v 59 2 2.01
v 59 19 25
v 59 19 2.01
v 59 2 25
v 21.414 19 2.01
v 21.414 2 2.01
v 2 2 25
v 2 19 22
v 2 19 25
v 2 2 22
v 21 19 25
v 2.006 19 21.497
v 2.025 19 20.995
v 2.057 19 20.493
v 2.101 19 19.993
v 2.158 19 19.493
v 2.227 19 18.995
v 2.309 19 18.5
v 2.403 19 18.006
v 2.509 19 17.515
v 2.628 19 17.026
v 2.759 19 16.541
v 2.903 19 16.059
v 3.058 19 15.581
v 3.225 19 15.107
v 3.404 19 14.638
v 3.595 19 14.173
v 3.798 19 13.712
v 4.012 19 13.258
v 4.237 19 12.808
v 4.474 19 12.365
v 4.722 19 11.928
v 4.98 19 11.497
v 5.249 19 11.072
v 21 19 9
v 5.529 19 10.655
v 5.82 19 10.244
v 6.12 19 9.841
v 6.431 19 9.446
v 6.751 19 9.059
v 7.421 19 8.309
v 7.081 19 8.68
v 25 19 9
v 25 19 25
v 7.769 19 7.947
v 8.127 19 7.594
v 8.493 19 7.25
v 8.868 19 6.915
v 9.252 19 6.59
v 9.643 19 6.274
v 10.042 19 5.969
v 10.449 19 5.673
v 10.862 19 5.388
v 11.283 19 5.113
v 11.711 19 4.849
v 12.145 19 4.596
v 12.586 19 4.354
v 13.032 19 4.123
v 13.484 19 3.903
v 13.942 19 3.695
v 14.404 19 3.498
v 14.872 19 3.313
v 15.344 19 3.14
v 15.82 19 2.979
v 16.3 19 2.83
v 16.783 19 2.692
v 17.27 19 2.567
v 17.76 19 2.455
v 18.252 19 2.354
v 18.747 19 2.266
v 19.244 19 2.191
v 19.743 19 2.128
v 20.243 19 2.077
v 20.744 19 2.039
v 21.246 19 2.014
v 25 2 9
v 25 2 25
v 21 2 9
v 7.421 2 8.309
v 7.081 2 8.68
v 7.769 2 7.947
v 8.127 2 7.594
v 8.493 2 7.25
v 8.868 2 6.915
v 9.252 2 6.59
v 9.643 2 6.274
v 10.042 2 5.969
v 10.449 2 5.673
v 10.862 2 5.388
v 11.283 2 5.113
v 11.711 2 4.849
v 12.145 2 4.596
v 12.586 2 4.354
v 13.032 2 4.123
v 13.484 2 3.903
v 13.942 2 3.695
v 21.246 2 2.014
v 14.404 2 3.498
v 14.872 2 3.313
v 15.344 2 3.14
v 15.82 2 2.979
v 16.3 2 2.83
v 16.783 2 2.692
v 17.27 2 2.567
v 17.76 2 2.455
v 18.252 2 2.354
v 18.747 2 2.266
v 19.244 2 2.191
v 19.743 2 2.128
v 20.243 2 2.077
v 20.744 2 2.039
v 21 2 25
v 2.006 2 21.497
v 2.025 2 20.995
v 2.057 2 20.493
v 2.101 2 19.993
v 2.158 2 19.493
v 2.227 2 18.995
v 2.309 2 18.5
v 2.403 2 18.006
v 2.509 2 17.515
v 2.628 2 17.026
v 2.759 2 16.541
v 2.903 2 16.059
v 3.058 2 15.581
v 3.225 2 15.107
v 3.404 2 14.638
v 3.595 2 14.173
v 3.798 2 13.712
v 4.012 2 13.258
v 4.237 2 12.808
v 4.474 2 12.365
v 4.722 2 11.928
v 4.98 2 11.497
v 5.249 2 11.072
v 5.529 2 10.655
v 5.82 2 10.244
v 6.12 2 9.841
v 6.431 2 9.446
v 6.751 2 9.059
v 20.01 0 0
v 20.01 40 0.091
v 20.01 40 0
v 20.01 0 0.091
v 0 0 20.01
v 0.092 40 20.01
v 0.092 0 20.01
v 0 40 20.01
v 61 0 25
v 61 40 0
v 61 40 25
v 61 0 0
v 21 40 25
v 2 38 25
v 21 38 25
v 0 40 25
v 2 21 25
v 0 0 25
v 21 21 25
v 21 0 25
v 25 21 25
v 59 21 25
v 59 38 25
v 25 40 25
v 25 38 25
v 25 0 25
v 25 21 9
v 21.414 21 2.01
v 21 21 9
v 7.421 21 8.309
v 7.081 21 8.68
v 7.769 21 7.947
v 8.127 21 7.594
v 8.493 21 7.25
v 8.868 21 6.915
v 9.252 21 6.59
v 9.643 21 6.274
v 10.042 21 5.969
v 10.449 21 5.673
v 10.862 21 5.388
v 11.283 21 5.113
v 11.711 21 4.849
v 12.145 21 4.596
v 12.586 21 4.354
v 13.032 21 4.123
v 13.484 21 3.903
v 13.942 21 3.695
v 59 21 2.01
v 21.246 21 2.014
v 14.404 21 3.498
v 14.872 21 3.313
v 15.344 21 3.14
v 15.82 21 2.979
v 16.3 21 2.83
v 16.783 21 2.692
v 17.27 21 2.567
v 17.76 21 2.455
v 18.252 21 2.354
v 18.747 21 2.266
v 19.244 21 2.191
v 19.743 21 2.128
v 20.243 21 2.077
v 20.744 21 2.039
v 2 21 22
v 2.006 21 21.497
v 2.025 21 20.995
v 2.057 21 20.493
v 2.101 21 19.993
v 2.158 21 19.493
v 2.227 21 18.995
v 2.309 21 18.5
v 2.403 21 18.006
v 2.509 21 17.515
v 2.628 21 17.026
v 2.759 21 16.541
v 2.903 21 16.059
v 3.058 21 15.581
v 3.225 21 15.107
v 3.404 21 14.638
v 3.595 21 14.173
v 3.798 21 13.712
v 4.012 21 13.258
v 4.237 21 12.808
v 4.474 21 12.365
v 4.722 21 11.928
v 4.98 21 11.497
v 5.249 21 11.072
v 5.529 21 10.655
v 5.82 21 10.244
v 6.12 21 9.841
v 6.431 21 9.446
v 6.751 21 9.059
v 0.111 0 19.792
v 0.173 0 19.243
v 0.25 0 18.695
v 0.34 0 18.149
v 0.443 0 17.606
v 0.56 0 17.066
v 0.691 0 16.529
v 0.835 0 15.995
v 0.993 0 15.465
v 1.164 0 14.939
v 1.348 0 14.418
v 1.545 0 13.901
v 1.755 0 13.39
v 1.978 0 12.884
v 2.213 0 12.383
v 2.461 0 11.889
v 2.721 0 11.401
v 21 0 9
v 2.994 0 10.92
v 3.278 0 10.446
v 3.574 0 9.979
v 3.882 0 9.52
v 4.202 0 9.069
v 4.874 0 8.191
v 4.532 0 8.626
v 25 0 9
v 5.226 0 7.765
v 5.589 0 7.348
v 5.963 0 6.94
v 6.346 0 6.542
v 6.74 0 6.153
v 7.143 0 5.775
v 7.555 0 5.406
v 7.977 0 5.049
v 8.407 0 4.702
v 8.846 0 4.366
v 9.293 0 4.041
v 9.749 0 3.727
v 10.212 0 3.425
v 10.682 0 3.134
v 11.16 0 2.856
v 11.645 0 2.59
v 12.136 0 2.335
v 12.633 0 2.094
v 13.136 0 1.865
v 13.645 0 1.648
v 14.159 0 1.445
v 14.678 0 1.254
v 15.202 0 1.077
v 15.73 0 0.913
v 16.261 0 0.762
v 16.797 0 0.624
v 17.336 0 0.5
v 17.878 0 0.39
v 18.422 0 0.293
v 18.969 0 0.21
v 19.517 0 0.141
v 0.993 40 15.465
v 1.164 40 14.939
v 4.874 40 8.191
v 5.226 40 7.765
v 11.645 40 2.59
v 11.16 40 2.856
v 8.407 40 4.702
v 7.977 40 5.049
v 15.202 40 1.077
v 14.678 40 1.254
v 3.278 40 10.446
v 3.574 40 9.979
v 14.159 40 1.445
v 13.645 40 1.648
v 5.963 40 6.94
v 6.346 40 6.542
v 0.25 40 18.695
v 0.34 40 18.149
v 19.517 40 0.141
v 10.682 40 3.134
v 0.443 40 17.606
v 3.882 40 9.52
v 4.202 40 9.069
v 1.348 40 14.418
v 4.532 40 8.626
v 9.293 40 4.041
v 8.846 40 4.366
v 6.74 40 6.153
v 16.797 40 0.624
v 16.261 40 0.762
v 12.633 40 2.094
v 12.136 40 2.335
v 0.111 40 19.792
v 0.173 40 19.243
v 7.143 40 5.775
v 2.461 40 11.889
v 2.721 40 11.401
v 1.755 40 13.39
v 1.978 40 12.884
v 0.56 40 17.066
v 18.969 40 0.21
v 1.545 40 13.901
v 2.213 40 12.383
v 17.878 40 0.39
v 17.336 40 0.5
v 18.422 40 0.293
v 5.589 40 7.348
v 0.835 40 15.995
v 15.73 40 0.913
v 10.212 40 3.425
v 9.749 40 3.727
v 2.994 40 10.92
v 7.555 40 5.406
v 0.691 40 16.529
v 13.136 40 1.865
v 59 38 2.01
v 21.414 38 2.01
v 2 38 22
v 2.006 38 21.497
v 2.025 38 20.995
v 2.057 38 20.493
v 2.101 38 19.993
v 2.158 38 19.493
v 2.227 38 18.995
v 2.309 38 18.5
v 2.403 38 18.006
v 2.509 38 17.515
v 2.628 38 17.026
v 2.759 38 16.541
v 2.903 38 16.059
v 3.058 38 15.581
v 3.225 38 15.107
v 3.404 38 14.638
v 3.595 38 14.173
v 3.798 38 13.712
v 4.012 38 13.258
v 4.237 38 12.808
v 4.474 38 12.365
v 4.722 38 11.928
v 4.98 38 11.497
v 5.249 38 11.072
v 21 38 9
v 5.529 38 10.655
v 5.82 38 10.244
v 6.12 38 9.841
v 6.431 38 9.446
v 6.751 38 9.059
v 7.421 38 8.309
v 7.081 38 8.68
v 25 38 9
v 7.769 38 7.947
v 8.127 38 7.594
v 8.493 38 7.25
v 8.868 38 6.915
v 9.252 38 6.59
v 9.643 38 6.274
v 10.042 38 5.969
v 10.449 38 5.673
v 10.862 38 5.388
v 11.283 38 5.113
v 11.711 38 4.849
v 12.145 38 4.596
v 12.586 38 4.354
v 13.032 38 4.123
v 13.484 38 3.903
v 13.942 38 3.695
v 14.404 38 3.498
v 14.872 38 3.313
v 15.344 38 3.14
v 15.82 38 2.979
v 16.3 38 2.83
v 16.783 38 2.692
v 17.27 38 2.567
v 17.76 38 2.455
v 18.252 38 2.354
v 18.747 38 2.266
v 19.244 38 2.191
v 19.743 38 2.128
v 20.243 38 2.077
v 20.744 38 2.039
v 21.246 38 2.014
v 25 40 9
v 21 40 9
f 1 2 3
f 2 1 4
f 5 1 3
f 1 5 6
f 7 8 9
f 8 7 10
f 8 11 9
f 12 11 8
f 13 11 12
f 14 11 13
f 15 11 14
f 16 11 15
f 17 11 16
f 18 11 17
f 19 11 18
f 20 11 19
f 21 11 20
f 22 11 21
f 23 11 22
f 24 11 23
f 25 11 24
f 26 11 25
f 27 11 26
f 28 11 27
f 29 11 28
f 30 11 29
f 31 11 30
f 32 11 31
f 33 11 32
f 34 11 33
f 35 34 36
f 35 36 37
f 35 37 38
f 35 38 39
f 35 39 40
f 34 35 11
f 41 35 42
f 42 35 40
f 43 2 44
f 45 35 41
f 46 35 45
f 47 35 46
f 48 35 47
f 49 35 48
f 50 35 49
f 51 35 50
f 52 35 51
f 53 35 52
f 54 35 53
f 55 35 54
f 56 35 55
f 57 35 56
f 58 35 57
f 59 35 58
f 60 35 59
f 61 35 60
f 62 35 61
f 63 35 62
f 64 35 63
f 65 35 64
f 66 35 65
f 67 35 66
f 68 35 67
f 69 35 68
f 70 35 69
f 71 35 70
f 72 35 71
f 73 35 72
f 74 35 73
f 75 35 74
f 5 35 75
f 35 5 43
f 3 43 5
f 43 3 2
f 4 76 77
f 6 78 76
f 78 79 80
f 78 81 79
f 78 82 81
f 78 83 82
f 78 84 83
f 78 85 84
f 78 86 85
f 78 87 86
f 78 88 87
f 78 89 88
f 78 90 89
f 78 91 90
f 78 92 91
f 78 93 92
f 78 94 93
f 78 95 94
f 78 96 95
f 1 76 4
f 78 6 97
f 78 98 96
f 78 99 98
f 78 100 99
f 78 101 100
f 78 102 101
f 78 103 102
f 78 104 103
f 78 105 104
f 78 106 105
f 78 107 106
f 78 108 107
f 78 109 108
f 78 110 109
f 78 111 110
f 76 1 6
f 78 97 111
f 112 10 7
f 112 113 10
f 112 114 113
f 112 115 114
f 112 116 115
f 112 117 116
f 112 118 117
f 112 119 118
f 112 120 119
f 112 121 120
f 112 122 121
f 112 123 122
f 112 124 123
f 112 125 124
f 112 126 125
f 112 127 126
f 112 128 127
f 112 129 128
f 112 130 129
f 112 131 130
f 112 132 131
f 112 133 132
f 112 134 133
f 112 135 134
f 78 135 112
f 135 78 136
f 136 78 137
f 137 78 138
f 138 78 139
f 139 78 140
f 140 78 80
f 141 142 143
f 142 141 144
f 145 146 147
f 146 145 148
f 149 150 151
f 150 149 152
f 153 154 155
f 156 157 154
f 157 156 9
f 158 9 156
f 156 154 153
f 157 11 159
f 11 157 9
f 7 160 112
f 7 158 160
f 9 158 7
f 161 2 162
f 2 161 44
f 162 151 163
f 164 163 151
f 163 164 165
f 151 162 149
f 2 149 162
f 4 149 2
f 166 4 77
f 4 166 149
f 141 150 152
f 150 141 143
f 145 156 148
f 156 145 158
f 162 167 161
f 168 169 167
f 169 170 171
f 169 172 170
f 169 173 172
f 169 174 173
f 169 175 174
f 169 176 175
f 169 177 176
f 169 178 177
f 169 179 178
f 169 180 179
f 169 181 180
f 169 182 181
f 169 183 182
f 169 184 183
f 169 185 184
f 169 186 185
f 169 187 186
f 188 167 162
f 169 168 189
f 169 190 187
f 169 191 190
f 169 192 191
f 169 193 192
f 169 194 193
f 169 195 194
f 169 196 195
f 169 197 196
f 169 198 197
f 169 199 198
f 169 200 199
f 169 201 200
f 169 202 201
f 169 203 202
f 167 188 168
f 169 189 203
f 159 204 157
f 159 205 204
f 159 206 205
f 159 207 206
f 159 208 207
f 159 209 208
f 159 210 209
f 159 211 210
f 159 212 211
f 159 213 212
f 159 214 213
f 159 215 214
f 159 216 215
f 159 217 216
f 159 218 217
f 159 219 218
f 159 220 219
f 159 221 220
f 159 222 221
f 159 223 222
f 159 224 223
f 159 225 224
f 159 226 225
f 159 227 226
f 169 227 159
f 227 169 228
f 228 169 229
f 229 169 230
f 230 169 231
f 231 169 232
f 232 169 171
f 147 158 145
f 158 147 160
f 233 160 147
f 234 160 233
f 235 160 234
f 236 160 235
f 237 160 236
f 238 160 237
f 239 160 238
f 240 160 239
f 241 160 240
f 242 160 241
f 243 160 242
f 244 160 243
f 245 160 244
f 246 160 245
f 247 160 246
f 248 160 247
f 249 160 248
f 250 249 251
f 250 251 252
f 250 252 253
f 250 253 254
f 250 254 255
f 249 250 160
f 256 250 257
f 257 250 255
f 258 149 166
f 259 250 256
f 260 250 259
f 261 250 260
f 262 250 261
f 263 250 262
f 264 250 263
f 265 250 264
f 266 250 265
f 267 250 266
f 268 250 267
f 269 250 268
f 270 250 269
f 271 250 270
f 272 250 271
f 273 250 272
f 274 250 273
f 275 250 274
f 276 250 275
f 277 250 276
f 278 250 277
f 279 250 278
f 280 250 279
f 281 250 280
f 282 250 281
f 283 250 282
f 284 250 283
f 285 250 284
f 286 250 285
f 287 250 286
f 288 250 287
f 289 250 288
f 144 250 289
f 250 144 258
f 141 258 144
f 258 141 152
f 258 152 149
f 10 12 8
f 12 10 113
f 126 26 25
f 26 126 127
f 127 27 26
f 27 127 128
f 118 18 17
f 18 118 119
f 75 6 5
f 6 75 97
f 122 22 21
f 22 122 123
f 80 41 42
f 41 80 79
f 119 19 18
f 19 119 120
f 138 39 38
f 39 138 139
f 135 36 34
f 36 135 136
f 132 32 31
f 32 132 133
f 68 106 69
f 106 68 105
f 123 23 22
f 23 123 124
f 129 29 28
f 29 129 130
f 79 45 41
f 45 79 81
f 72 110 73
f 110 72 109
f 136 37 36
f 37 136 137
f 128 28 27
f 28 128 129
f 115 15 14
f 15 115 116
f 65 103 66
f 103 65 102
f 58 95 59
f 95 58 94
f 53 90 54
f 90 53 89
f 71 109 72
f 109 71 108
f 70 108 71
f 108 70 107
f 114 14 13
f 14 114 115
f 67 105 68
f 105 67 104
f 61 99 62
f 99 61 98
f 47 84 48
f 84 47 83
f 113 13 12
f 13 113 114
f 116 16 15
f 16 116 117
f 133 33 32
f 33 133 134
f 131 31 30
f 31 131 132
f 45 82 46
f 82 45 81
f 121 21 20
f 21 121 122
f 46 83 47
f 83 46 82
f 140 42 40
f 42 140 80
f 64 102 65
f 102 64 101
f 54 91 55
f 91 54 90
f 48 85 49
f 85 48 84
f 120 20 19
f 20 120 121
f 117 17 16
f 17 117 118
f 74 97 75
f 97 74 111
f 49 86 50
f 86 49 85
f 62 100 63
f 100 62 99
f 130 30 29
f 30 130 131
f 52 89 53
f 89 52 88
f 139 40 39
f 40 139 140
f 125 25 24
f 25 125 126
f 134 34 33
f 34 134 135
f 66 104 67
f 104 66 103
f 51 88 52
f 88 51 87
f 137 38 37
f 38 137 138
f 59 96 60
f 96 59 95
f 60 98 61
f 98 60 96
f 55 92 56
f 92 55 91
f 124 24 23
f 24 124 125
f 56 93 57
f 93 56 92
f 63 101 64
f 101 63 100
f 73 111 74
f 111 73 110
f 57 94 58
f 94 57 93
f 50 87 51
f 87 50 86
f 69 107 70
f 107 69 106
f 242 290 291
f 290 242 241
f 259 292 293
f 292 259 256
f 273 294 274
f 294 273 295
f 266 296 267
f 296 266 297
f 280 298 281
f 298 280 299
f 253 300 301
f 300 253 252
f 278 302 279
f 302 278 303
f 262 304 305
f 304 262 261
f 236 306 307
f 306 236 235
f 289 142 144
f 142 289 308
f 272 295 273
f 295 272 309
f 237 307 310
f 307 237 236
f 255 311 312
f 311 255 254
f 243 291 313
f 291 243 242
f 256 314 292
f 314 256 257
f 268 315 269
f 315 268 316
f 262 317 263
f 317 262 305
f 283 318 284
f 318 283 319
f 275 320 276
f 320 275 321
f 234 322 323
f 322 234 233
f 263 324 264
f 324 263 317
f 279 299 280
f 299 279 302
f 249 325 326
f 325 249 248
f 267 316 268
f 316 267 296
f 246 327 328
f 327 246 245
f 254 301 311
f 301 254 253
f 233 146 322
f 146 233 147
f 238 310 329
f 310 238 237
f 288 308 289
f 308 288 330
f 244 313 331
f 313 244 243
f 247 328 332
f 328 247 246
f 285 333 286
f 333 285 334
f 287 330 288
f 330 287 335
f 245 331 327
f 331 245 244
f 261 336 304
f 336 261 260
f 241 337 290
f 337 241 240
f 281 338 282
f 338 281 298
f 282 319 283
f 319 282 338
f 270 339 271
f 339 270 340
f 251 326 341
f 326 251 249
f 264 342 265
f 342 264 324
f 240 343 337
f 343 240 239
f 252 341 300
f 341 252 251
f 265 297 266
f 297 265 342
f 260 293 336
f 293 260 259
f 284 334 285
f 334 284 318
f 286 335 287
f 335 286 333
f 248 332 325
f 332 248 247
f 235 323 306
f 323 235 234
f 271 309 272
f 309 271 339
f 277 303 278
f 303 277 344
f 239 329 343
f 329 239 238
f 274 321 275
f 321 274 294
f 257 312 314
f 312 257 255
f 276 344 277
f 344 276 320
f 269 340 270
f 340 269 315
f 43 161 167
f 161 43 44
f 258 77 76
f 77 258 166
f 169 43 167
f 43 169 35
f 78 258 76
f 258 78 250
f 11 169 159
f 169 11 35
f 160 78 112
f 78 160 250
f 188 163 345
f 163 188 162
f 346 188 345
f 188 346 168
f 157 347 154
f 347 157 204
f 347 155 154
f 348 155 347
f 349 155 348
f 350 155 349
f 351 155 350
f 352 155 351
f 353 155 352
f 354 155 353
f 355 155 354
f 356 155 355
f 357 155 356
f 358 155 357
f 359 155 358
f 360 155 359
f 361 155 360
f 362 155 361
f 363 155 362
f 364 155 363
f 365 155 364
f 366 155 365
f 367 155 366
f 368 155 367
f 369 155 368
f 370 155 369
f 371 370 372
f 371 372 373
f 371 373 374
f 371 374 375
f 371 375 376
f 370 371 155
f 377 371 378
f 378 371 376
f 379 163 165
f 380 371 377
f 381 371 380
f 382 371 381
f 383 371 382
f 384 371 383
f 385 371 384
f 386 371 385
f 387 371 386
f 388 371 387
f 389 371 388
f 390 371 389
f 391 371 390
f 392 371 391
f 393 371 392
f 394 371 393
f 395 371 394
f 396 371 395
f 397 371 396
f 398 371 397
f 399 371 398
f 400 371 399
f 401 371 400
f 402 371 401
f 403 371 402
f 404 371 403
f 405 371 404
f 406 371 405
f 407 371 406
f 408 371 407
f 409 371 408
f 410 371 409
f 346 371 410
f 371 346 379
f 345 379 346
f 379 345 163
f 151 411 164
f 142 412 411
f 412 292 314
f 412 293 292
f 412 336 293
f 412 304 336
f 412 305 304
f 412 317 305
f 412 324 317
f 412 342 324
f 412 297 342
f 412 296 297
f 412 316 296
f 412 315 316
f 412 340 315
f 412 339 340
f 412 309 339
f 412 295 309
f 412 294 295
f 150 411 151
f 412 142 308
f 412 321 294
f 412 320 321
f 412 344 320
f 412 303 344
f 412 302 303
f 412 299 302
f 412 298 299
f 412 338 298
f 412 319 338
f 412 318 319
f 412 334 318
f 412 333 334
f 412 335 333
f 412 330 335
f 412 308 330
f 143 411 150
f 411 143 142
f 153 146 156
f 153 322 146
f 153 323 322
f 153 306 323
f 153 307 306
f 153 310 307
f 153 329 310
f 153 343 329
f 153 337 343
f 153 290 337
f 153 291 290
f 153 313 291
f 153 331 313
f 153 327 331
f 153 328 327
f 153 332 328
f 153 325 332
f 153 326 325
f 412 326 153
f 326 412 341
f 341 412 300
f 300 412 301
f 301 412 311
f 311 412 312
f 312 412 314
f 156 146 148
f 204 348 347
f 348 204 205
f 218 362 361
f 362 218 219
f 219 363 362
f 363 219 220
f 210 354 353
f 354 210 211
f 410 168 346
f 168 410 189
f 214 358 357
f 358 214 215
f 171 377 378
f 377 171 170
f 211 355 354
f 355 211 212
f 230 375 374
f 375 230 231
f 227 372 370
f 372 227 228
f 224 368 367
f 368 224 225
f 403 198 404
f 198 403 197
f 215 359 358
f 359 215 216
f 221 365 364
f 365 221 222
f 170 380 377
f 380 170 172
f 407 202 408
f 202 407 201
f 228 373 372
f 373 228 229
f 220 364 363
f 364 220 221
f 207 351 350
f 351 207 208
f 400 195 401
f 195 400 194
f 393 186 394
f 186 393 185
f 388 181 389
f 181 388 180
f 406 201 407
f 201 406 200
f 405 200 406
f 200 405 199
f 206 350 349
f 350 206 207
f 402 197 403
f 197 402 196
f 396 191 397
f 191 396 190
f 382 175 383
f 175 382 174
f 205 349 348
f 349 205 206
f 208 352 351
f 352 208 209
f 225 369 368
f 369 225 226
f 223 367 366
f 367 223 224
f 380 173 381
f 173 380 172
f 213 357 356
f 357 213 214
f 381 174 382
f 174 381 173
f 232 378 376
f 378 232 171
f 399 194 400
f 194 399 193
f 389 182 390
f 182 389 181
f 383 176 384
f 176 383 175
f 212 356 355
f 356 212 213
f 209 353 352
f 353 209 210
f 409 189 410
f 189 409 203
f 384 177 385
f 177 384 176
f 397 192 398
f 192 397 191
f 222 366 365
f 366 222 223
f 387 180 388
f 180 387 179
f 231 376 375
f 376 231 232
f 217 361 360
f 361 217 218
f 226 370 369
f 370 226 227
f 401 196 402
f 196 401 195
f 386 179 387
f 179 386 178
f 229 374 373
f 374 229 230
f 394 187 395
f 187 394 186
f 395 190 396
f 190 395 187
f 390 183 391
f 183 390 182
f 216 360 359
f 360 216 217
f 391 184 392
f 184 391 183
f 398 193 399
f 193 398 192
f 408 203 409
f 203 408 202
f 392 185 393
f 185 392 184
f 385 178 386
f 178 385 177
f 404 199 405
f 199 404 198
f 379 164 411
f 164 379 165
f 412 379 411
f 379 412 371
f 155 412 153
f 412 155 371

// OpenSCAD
/******************************************************************************
 * vim:ts=4:sw=4:sts=4:et:ai:tw=80:fdm=marker
 *
 * Dymo LetraTag Holder
 * Version 1 - 19.09.2020 
 * CC-BY-NC-SA 2020 by oli@huf.org (ohuf@Thingiverse)
 *
 * https://www.thingiverse.com/thing:4601782 und
 * https://www.printables.com/model/44316-customizable-dymo-letratag-holder
 * 
 * (Deutscher Text: Siehe unten...)
 * 
 * This is a customizable holder for DYMO's LetraTag label  cartridges
 * 
 * Enjoy, have fun remixing and let me know when you've made one, and what for!
 * 
 * ----------------------------------------------------------------------------
 * [DE:]
 * 
 * Ein "Customizable" Halter für DYMO's LetraTag label-Kassetten.
 * 
 * Wenn du einen hergestellt hast, lass es mich über "I Made One" wissen!
 * 
 * Konstruiert in OpenSCAD: viel Spaß beim Remixen!
 * 
 * 
 * License: CC-BY-NC-SA : oli@huf.org
 * 
 * Read all about it here: http://creativecommons.org/licenses/by-nc-sa/4.0/
 *
 * The following in English only (entschuldigung):
 * 
 * Edited by Roy Sigurd Karlsbakk <roy@karlsbakk.net>
 * - Code cleanup
 * - Just a tunable, but I extended the length by a couple of millimetres to
 *   allow for chinese copies that turned out to be longer.
 * - Just a tunable, but I changed the wall thickness (mat) from 1.2 to 2, since
 *   1.2 made it very flimsy and brittle with ABS and I can only dream (in some
 *   rather bad nightmares) how that'll be in PLA.
 *
 * TODO:
 * - Top cover coming (2025-08-04), but not finished.
 * - Hinges coming (2025-08-04), but
 *   https://github.com/BelfrySCAD/BOSL2/wiki/hinges.scad looks promising
 * 
 *****************************************************************************/

$fn=250;
bugfix = $preview ? .1 : 0;

dt1=0.01;
dt2=dt1*2;
prt_delta=0.4;

b_x=57;
b_y=17; // orig: 17mm
b_z=23;

notch_x=10;
notch_z=9;

notch_dy=2;
notch_dz=3;
mat=2;

// How many do we need?
anzahl=2;

module slope() {
    translate([0,b_y+2*mat, 0]) {
        rotate([90,0,0]) {
            translate([20+mat, 20+mat, 0]) {
                difference() {
                    cylinder(r=20+mat, h=b_y+2*mat);
                    union() {
                        translate([0, 0, mat]) {
                            cylinder(r=20, h=b_y);
                        }
                        translate([-20-mat, 0, -dt1]) {
                            cube([50, 50, b_y+2*mat+dt2]);
                        }
                        translate([0, -20-mat, -dt1]) {
                            cube([50, 50, b_y+2*mat+dt2]);
                        }
                    }
                }
            }
        }
    }
}


module lower_part() {
    for(i = [0:anzahl-1]) {
        translate([0, i*(b_y+mat), 0])
        difference() {
            union() {
                difference() {
                    cube([b_x+mat*2, b_y+mat*2, b_z+mat]);
                    union() {
                        translate([mat, mat, mat+dt1]) {
                            cube([b_x, b_y, b_z+bugfix]);
                        }
                        translate([-dt1, -dt1, -dt1]) {
                            cube([20+dt2, b_y+2*mat+dt2, 20+dt2]);
                        }
//                      translate([notch_x, -dt1, notch_z])
//                          color("red")
//                          cube([20, notch_dy+mat, notch_dz]);
//                      // Vertical notch:
//                      translate([20, -dt1, notch_z])
//                          color("red")
//                          cube([notch_dy+mat, notch_dz,20 ]);
                    }
                }
                slope();
            }
            union() {
                // Vertical notch:
                translate([21, -dt1, notch_z]) {
                    color("red") {
                        cube([notch_dy+mat, b_y+2*mat+dt2, 20 ]);
                    }
                }
                // Horizontal notch?
//              translate([notch_x, -dt1, notch_z])
//                  color("red")
//                  cube([20, notch_dy+mat, notch_dz]);
            }
        }
    }
}

module upper_part() {
    for(i = [0:anzahl-1]) {
        translate([0, i*(b_y+mat), 0])
        difference() {
            union() {
                difference() {
                    cube([b_x+mat*2, b_y+mat*2, b_z+mat]);
                    union() {
                        translate([mat, mat, mat+dt1]) {
                            cube([b_x, b_y, b_z+bugfix]);
                        }
                        translate([-dt1, -dt1, -dt1]) {
                            cube([20+dt2, b_y+2*mat+dt2, 20+dt2]);
                        }
// What's this?                    
//                      translate([notch_x, -dt1, notch_z]) {
//                          color("red") {
//                              cube([20, notch_dy+mat, notch_dz]);
//                          }
//                      }
//                      // Vertical notch:
//                      translate([20, -dt1, notch_z]) {
//                          color("red") {
//                              cube([notch_dy+mat, notch_dz,20 ]);
//                          }
//                      }
                    }
                }
                slope();
            }
            union() {
                //vertical notch:
                translate([21, -dt1, notch_z]) {
                    color("red") {
                        cube([notch_dy+mat, b_y+2*mat+dt2, 20 ]);
                    }
                }
                // Horizontal notch?
//              translate([notch_x, -dt1, notch_z]) {
//                  color("red") {
//                      cube([20, notch_dy+mat, notch_dz]);
//                  }
//              }
            }
        }
    }
}

lower_part();
